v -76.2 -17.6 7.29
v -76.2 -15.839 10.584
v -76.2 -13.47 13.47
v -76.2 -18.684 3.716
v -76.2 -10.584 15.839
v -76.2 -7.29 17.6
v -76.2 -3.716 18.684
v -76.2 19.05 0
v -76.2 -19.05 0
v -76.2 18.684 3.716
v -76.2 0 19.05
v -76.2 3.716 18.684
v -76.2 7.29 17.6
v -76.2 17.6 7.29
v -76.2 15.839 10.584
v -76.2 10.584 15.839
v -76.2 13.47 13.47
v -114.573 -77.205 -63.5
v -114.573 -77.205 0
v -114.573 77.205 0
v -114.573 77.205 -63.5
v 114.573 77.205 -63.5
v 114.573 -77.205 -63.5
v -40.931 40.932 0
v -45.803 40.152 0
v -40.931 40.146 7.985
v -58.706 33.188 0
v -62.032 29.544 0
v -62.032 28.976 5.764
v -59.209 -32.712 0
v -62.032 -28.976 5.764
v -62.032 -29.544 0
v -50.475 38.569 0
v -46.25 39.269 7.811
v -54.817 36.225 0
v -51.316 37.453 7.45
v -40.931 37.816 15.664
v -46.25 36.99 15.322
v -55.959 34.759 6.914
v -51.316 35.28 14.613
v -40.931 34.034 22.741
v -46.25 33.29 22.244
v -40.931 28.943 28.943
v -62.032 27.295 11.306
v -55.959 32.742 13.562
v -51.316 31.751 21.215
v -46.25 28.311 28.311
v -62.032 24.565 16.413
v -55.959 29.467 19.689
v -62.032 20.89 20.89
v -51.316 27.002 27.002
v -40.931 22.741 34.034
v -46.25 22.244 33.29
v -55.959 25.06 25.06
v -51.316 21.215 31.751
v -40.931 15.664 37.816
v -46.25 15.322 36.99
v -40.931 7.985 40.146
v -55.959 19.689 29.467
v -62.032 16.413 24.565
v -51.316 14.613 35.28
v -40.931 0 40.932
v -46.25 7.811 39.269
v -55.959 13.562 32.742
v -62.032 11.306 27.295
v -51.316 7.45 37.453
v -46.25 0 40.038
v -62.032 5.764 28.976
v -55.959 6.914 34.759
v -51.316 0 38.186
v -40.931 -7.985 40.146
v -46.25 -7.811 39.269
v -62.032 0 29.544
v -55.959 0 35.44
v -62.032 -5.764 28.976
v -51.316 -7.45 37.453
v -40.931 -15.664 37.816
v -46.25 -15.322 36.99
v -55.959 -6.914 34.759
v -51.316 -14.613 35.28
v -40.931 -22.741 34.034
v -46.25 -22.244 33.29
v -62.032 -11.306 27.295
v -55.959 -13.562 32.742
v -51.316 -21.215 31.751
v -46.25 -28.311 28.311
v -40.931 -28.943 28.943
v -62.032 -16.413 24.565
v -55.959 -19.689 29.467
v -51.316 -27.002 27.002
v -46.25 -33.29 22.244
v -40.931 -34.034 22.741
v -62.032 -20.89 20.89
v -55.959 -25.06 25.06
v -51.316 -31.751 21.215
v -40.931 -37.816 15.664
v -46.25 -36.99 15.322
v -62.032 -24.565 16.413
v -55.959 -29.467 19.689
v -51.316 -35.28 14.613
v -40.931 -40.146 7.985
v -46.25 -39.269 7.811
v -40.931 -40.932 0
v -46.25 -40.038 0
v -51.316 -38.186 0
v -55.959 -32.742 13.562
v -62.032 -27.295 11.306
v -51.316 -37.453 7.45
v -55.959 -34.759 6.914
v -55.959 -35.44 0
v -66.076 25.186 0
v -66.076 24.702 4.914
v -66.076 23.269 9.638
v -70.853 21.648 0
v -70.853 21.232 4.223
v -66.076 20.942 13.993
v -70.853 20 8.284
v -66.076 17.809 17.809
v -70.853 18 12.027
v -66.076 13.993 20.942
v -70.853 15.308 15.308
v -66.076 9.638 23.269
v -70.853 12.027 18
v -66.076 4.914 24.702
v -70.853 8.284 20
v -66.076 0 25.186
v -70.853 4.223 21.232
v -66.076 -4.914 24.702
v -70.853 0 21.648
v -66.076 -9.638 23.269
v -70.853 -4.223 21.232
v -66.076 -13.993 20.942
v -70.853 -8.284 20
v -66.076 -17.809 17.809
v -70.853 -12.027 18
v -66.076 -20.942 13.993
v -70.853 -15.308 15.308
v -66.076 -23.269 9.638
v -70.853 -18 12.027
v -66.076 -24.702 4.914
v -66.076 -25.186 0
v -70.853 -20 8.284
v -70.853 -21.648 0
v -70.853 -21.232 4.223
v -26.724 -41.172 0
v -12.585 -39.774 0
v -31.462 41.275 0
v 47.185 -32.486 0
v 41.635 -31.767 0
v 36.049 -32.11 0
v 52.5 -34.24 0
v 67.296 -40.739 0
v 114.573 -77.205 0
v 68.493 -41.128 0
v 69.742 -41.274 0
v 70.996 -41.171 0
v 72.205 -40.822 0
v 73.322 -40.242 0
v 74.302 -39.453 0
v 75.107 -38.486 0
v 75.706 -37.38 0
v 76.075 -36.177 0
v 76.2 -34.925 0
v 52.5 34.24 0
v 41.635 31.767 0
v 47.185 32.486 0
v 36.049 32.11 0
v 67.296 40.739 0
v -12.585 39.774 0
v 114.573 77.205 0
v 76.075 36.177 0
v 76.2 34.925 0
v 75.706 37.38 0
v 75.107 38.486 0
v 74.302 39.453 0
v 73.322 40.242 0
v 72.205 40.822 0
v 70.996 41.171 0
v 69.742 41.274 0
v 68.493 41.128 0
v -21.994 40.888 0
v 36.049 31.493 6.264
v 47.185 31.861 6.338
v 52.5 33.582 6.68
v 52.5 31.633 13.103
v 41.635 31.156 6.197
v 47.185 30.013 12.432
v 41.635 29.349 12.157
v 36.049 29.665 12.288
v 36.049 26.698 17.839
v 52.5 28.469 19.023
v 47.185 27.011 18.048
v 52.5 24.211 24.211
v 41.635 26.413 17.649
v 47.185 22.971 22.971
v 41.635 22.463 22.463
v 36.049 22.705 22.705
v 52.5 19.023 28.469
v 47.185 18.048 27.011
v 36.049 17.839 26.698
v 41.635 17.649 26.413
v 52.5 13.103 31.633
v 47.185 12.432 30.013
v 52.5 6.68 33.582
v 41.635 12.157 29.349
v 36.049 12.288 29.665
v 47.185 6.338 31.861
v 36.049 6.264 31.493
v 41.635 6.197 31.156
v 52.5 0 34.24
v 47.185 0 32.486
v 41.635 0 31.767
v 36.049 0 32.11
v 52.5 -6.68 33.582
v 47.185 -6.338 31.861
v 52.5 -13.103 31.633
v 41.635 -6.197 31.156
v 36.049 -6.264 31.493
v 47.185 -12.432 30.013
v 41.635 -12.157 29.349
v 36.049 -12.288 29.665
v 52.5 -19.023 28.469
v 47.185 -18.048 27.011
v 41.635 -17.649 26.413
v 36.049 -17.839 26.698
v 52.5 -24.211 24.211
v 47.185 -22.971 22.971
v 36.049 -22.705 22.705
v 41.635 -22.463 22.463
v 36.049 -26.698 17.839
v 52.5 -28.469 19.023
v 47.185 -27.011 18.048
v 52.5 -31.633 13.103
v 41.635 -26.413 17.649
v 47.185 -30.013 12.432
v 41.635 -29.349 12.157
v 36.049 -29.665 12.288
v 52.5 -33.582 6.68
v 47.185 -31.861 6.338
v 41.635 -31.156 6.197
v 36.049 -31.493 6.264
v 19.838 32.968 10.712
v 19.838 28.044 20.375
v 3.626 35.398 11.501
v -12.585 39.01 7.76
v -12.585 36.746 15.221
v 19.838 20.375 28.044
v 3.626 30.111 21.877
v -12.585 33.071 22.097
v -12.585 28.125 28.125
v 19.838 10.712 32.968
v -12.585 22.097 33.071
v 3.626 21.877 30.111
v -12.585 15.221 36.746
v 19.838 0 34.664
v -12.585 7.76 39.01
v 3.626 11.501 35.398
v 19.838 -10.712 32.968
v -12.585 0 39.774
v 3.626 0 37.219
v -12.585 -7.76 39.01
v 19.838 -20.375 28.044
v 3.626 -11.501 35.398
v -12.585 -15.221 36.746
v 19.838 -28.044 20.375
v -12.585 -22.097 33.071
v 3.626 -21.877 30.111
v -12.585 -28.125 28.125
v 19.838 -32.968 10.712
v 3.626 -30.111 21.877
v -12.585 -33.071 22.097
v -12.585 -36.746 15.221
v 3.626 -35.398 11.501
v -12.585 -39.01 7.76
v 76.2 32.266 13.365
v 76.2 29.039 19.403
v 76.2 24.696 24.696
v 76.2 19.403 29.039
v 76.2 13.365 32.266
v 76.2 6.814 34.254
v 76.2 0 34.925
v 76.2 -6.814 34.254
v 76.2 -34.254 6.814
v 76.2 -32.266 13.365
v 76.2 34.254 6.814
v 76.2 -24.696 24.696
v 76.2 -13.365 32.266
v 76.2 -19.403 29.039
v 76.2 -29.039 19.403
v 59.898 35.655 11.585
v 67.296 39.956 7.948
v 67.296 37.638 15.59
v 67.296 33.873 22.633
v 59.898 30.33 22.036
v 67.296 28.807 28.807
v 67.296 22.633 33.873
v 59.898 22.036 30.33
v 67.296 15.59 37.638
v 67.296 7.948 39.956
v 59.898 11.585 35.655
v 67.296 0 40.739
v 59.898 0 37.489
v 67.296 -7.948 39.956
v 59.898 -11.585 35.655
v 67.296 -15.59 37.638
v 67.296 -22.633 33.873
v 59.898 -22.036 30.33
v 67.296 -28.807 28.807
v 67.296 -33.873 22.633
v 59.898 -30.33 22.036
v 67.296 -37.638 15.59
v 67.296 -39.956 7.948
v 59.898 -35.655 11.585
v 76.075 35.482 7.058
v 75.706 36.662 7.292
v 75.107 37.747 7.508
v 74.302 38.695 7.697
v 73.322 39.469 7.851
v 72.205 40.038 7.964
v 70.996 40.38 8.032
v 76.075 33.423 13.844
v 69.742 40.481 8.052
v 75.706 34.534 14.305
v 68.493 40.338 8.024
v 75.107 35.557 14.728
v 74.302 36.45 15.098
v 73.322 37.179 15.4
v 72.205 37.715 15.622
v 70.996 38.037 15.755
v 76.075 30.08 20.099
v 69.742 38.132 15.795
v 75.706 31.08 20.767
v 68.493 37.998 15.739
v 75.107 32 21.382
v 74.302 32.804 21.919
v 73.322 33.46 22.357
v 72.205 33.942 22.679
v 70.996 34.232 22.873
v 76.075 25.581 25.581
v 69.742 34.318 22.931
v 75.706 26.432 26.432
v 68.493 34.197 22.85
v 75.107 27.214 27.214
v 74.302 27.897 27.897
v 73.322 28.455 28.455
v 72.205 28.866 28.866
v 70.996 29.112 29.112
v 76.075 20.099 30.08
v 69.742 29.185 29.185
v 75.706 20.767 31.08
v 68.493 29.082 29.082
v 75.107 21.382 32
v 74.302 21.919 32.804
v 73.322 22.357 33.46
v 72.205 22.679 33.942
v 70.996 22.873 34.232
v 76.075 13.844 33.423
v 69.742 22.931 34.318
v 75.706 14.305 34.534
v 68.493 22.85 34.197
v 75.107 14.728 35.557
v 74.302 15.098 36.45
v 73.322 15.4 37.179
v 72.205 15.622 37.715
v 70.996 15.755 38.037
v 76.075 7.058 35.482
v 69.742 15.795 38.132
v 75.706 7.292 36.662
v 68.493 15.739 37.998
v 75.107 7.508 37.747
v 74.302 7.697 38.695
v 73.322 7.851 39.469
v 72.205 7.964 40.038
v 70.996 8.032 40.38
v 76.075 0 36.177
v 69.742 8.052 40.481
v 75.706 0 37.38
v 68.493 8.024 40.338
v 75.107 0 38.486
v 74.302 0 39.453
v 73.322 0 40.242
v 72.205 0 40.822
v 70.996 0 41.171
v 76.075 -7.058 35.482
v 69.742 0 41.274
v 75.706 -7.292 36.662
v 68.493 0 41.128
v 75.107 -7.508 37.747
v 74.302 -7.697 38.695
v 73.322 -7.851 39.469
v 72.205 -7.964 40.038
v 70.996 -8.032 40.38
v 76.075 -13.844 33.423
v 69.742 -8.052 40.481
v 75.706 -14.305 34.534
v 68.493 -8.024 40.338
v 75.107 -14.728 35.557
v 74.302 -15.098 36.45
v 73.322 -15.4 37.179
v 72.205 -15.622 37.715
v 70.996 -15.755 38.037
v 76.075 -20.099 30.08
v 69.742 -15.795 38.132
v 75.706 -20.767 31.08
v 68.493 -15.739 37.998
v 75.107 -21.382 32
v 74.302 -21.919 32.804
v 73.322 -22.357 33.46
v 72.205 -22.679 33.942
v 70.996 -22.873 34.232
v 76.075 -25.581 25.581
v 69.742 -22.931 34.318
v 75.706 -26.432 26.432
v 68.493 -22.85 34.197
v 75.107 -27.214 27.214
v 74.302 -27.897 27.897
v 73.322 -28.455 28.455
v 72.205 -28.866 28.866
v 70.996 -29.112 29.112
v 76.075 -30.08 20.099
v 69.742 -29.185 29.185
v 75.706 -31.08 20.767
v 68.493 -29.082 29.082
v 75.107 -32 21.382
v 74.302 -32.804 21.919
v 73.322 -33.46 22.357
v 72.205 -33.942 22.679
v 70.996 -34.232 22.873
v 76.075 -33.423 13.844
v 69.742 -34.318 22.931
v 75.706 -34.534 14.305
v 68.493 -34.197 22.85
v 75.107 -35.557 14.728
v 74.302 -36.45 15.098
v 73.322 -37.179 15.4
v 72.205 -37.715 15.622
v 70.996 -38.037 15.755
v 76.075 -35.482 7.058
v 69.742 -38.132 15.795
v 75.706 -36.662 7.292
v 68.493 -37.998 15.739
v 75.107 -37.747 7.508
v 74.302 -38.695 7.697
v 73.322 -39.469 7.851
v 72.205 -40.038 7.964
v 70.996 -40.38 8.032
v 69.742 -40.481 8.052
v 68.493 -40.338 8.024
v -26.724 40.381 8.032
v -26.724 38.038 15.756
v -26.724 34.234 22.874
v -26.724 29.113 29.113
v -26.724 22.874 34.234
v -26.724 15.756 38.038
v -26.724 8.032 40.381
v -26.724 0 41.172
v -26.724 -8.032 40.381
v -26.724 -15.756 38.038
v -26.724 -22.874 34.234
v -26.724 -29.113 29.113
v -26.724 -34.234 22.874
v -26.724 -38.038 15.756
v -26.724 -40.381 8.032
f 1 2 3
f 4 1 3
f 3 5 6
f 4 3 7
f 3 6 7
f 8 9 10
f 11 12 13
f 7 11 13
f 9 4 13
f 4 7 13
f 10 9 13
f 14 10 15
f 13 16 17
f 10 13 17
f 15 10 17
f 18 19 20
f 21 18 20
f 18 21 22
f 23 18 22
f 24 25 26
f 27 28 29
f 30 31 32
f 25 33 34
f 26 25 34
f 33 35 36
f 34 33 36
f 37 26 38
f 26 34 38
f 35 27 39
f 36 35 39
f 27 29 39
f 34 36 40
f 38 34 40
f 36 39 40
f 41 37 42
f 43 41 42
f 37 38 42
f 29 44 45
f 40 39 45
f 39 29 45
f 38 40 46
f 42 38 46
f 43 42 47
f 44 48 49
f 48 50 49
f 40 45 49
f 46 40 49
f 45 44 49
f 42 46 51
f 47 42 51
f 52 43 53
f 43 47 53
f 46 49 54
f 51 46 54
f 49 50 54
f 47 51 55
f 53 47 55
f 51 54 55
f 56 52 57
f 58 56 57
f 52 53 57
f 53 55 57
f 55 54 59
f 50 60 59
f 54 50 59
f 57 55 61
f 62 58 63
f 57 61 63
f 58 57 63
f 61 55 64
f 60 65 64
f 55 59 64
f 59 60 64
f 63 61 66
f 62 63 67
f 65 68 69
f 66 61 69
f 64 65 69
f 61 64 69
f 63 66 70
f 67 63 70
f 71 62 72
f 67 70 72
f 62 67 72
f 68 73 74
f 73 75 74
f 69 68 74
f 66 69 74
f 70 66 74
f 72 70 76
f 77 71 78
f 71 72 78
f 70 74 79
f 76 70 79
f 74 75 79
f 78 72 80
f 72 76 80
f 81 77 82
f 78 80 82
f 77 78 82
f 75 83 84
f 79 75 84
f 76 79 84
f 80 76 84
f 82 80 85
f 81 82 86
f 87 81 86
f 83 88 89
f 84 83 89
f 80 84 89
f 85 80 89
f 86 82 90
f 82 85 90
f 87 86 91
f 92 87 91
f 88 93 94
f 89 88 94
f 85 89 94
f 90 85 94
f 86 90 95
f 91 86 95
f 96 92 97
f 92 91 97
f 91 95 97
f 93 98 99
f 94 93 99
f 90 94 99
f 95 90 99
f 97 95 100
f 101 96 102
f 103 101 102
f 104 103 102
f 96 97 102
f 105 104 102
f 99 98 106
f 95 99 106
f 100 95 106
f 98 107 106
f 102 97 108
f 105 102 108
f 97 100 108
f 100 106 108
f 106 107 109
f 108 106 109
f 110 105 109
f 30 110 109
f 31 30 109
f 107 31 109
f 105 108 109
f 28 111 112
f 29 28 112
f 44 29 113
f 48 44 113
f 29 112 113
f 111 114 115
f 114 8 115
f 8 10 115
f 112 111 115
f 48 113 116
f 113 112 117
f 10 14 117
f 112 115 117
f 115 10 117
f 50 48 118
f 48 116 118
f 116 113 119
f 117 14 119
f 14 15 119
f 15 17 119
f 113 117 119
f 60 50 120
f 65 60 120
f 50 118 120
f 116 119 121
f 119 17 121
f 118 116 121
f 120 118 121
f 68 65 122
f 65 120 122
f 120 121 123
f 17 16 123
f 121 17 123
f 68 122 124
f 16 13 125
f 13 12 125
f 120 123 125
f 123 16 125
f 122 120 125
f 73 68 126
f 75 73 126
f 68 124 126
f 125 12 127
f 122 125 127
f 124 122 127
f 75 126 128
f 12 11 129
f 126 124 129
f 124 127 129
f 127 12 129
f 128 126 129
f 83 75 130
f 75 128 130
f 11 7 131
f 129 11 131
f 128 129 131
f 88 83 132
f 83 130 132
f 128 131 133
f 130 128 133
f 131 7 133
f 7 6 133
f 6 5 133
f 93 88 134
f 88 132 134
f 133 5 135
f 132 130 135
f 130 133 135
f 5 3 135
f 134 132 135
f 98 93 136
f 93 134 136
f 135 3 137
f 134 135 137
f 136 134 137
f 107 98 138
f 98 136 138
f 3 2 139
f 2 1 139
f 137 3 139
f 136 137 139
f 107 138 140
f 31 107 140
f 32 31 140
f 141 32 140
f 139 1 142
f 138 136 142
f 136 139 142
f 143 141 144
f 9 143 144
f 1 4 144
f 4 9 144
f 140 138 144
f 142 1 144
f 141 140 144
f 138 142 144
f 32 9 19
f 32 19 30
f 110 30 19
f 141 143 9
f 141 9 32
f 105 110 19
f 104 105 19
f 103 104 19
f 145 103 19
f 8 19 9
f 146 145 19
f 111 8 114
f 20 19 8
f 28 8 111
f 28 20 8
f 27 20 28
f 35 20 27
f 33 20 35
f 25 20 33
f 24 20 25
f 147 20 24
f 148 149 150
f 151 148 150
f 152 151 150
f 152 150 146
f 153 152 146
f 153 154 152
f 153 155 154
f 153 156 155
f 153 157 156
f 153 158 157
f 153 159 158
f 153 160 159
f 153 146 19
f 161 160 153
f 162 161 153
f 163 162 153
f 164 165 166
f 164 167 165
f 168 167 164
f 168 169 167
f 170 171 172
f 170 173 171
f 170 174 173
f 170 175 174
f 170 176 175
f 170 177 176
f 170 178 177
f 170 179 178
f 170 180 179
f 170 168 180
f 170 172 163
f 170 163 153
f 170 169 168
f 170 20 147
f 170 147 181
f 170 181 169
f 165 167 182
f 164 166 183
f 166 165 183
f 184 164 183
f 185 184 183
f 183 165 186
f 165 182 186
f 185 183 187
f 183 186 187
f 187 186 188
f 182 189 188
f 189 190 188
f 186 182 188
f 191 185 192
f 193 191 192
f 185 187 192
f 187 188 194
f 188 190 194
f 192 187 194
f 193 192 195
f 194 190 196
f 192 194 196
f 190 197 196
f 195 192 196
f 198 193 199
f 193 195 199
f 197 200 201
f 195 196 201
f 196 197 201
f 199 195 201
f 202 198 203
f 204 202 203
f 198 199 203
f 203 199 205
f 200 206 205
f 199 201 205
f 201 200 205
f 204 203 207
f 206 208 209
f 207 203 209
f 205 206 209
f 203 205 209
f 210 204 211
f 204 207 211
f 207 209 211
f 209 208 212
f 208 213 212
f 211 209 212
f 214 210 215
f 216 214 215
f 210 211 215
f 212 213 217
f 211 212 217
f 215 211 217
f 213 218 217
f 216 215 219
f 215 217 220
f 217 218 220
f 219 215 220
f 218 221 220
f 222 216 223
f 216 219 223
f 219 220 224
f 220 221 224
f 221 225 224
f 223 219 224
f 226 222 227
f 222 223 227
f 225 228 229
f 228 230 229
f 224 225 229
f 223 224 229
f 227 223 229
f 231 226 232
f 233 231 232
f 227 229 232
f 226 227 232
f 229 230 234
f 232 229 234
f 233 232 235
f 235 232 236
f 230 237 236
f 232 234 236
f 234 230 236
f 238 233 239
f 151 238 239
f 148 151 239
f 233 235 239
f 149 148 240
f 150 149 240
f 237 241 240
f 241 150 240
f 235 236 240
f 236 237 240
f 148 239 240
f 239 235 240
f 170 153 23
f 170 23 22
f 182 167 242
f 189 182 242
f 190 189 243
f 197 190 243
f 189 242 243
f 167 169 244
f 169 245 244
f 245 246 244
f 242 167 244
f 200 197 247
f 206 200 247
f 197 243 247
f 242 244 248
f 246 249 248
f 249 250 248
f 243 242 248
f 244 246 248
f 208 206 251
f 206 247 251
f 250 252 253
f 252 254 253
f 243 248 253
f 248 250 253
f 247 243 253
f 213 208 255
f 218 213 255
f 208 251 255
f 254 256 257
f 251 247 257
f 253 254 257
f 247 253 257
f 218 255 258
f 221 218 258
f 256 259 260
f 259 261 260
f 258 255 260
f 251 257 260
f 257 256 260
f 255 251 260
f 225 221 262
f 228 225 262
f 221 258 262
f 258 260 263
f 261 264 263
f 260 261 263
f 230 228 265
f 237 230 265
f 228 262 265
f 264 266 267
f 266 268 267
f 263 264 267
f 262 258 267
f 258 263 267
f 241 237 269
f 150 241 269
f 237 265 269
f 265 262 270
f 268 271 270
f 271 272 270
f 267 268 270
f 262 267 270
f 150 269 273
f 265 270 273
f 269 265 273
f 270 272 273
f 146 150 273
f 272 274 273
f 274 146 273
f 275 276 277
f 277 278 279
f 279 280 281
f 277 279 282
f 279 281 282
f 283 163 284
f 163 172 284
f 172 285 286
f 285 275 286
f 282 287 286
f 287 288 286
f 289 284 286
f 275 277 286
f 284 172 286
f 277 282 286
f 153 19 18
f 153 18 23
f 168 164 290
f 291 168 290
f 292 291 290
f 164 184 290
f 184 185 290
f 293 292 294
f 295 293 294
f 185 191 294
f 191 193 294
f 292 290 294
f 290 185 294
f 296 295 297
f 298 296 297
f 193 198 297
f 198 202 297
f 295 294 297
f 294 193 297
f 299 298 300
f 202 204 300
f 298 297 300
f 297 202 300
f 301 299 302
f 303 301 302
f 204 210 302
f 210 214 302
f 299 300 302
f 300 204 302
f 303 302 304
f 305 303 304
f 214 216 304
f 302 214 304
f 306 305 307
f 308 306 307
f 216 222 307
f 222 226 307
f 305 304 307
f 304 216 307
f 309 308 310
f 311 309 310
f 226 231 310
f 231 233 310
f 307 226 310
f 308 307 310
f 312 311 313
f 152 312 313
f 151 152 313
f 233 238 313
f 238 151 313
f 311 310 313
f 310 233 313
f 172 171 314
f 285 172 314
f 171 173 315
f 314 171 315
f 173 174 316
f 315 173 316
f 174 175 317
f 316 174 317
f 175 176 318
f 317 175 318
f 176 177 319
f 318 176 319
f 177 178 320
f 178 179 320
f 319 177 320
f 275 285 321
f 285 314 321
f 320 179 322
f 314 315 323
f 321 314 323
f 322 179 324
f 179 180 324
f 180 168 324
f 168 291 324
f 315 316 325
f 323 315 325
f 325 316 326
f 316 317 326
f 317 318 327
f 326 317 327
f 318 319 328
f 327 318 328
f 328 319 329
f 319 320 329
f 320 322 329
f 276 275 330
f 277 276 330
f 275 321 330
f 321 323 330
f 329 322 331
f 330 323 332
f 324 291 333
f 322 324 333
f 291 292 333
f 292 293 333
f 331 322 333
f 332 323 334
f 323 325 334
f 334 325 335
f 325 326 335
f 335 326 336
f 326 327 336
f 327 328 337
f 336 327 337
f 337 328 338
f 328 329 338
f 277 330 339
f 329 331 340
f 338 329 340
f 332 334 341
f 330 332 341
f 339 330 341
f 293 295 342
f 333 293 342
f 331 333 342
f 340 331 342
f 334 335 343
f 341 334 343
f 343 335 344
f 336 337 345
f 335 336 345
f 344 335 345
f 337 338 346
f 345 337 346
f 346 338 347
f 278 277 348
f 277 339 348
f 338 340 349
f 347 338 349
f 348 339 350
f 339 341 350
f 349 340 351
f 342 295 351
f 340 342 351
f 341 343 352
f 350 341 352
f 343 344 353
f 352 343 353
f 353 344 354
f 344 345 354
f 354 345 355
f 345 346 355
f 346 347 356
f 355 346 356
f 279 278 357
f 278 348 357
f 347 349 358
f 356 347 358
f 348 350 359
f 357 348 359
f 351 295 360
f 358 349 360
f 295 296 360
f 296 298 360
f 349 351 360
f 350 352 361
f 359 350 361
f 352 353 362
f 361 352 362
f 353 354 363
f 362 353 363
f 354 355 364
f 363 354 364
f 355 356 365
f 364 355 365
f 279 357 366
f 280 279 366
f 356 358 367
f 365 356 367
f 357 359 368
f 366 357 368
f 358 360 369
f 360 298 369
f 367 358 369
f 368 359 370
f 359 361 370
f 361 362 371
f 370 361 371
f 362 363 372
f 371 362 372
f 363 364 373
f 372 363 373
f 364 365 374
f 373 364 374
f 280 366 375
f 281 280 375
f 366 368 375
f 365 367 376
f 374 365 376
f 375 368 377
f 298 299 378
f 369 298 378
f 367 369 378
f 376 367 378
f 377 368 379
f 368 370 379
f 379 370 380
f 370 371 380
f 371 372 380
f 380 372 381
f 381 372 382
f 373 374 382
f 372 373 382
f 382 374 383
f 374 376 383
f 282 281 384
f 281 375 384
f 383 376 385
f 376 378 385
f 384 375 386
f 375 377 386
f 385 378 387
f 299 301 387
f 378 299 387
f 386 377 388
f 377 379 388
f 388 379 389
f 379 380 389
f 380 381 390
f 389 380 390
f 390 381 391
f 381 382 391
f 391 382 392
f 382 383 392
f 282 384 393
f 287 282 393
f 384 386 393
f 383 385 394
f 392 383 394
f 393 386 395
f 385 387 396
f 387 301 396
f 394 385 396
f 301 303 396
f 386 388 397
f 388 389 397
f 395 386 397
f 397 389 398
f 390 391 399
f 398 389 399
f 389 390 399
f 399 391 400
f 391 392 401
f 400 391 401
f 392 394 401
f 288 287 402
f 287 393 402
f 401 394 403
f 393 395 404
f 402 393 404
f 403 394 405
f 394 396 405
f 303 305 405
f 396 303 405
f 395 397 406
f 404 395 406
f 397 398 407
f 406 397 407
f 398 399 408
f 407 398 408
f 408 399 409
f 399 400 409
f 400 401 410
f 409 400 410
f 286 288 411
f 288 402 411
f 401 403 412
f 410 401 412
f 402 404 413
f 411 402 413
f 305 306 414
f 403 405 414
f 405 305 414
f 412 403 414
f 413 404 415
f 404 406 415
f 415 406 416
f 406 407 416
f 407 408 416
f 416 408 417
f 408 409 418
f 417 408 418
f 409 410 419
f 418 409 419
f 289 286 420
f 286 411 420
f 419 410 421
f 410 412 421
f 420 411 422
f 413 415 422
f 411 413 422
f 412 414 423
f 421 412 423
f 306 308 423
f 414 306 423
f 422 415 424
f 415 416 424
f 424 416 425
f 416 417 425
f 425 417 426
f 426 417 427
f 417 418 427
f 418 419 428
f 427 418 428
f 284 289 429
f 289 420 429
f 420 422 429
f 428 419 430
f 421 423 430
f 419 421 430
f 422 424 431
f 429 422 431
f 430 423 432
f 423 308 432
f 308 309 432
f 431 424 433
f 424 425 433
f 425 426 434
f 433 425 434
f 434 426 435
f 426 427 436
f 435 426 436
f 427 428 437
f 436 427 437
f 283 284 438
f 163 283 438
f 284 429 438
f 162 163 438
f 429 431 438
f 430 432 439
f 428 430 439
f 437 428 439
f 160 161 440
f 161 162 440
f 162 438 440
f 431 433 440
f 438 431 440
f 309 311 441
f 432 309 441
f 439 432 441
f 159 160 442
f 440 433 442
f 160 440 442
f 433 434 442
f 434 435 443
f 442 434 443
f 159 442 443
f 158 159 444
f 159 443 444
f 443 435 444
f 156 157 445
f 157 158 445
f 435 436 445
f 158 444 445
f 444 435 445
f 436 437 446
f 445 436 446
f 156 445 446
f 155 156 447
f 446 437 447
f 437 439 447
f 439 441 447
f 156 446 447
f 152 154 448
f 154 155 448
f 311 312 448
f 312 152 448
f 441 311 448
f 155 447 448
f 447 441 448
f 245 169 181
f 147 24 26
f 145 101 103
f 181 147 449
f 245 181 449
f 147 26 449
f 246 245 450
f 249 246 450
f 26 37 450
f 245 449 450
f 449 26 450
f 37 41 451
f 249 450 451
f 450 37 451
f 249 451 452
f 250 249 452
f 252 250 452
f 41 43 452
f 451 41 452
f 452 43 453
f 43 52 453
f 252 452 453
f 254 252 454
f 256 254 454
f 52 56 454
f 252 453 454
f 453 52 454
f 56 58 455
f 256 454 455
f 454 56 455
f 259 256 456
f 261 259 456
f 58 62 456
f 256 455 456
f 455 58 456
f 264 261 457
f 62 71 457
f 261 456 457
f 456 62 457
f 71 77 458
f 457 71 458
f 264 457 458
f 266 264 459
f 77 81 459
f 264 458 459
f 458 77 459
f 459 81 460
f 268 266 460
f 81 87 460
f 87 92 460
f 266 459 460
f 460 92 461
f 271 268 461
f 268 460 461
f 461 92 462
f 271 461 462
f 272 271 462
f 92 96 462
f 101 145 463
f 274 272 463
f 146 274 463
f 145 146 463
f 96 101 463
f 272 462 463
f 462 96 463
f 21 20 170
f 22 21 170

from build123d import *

# Parameters (mm, degrees)
F2_W     = 229.145602
F2_H     = 154.409528
F3_DEPTH = 63.5


with BuildPart() as f1:
    # F0 (on Top) → F1 (revolve)
    with BuildSketch(Plane.XY):
        with BuildLine():
            Line((-76.2, 19.05), (-76.2, 0))
            Line((-76.2, 0), (76.2, 0))
            Line((76.2, 0), (76.2, 34.925))
            ThreePointArc((76.2, 34.925), (73.321803, 40.241868), (67.296352, 40.738895))
            Line((67.296352, 40.738895), (52.49993, 34.239835))
            ThreePointArc((52.49993, 34.239835), (44.42729, 31.994194), (36.048919, 32.109551))
            Line((36.048919, 32.109551), (-12.584829, 39.774077))
            ThreePointArc((-12.584829, 39.774077), (-26.724262, 41.172374), (-40.930638, 40.93221))
            ThreePointArc((-40.930638, 40.93221), (-52.695618, 37.488147), (-62.031521, 29.543512))
            ThreePointArc((-62.031521, 29.543512), (-68.382458, 23.306641), (-76.2, 19.05))
        make_face()
    revolve(axis=Axis((0, 0, 0), (1, 0, 0)))

    # F2 (on Top) → F3 (join)
    with BuildSketch(Plane.XY):
        Rectangle(F2_W, F2_H)
    extrude(amount=-F3_DEPTH)


solid = f1.part
